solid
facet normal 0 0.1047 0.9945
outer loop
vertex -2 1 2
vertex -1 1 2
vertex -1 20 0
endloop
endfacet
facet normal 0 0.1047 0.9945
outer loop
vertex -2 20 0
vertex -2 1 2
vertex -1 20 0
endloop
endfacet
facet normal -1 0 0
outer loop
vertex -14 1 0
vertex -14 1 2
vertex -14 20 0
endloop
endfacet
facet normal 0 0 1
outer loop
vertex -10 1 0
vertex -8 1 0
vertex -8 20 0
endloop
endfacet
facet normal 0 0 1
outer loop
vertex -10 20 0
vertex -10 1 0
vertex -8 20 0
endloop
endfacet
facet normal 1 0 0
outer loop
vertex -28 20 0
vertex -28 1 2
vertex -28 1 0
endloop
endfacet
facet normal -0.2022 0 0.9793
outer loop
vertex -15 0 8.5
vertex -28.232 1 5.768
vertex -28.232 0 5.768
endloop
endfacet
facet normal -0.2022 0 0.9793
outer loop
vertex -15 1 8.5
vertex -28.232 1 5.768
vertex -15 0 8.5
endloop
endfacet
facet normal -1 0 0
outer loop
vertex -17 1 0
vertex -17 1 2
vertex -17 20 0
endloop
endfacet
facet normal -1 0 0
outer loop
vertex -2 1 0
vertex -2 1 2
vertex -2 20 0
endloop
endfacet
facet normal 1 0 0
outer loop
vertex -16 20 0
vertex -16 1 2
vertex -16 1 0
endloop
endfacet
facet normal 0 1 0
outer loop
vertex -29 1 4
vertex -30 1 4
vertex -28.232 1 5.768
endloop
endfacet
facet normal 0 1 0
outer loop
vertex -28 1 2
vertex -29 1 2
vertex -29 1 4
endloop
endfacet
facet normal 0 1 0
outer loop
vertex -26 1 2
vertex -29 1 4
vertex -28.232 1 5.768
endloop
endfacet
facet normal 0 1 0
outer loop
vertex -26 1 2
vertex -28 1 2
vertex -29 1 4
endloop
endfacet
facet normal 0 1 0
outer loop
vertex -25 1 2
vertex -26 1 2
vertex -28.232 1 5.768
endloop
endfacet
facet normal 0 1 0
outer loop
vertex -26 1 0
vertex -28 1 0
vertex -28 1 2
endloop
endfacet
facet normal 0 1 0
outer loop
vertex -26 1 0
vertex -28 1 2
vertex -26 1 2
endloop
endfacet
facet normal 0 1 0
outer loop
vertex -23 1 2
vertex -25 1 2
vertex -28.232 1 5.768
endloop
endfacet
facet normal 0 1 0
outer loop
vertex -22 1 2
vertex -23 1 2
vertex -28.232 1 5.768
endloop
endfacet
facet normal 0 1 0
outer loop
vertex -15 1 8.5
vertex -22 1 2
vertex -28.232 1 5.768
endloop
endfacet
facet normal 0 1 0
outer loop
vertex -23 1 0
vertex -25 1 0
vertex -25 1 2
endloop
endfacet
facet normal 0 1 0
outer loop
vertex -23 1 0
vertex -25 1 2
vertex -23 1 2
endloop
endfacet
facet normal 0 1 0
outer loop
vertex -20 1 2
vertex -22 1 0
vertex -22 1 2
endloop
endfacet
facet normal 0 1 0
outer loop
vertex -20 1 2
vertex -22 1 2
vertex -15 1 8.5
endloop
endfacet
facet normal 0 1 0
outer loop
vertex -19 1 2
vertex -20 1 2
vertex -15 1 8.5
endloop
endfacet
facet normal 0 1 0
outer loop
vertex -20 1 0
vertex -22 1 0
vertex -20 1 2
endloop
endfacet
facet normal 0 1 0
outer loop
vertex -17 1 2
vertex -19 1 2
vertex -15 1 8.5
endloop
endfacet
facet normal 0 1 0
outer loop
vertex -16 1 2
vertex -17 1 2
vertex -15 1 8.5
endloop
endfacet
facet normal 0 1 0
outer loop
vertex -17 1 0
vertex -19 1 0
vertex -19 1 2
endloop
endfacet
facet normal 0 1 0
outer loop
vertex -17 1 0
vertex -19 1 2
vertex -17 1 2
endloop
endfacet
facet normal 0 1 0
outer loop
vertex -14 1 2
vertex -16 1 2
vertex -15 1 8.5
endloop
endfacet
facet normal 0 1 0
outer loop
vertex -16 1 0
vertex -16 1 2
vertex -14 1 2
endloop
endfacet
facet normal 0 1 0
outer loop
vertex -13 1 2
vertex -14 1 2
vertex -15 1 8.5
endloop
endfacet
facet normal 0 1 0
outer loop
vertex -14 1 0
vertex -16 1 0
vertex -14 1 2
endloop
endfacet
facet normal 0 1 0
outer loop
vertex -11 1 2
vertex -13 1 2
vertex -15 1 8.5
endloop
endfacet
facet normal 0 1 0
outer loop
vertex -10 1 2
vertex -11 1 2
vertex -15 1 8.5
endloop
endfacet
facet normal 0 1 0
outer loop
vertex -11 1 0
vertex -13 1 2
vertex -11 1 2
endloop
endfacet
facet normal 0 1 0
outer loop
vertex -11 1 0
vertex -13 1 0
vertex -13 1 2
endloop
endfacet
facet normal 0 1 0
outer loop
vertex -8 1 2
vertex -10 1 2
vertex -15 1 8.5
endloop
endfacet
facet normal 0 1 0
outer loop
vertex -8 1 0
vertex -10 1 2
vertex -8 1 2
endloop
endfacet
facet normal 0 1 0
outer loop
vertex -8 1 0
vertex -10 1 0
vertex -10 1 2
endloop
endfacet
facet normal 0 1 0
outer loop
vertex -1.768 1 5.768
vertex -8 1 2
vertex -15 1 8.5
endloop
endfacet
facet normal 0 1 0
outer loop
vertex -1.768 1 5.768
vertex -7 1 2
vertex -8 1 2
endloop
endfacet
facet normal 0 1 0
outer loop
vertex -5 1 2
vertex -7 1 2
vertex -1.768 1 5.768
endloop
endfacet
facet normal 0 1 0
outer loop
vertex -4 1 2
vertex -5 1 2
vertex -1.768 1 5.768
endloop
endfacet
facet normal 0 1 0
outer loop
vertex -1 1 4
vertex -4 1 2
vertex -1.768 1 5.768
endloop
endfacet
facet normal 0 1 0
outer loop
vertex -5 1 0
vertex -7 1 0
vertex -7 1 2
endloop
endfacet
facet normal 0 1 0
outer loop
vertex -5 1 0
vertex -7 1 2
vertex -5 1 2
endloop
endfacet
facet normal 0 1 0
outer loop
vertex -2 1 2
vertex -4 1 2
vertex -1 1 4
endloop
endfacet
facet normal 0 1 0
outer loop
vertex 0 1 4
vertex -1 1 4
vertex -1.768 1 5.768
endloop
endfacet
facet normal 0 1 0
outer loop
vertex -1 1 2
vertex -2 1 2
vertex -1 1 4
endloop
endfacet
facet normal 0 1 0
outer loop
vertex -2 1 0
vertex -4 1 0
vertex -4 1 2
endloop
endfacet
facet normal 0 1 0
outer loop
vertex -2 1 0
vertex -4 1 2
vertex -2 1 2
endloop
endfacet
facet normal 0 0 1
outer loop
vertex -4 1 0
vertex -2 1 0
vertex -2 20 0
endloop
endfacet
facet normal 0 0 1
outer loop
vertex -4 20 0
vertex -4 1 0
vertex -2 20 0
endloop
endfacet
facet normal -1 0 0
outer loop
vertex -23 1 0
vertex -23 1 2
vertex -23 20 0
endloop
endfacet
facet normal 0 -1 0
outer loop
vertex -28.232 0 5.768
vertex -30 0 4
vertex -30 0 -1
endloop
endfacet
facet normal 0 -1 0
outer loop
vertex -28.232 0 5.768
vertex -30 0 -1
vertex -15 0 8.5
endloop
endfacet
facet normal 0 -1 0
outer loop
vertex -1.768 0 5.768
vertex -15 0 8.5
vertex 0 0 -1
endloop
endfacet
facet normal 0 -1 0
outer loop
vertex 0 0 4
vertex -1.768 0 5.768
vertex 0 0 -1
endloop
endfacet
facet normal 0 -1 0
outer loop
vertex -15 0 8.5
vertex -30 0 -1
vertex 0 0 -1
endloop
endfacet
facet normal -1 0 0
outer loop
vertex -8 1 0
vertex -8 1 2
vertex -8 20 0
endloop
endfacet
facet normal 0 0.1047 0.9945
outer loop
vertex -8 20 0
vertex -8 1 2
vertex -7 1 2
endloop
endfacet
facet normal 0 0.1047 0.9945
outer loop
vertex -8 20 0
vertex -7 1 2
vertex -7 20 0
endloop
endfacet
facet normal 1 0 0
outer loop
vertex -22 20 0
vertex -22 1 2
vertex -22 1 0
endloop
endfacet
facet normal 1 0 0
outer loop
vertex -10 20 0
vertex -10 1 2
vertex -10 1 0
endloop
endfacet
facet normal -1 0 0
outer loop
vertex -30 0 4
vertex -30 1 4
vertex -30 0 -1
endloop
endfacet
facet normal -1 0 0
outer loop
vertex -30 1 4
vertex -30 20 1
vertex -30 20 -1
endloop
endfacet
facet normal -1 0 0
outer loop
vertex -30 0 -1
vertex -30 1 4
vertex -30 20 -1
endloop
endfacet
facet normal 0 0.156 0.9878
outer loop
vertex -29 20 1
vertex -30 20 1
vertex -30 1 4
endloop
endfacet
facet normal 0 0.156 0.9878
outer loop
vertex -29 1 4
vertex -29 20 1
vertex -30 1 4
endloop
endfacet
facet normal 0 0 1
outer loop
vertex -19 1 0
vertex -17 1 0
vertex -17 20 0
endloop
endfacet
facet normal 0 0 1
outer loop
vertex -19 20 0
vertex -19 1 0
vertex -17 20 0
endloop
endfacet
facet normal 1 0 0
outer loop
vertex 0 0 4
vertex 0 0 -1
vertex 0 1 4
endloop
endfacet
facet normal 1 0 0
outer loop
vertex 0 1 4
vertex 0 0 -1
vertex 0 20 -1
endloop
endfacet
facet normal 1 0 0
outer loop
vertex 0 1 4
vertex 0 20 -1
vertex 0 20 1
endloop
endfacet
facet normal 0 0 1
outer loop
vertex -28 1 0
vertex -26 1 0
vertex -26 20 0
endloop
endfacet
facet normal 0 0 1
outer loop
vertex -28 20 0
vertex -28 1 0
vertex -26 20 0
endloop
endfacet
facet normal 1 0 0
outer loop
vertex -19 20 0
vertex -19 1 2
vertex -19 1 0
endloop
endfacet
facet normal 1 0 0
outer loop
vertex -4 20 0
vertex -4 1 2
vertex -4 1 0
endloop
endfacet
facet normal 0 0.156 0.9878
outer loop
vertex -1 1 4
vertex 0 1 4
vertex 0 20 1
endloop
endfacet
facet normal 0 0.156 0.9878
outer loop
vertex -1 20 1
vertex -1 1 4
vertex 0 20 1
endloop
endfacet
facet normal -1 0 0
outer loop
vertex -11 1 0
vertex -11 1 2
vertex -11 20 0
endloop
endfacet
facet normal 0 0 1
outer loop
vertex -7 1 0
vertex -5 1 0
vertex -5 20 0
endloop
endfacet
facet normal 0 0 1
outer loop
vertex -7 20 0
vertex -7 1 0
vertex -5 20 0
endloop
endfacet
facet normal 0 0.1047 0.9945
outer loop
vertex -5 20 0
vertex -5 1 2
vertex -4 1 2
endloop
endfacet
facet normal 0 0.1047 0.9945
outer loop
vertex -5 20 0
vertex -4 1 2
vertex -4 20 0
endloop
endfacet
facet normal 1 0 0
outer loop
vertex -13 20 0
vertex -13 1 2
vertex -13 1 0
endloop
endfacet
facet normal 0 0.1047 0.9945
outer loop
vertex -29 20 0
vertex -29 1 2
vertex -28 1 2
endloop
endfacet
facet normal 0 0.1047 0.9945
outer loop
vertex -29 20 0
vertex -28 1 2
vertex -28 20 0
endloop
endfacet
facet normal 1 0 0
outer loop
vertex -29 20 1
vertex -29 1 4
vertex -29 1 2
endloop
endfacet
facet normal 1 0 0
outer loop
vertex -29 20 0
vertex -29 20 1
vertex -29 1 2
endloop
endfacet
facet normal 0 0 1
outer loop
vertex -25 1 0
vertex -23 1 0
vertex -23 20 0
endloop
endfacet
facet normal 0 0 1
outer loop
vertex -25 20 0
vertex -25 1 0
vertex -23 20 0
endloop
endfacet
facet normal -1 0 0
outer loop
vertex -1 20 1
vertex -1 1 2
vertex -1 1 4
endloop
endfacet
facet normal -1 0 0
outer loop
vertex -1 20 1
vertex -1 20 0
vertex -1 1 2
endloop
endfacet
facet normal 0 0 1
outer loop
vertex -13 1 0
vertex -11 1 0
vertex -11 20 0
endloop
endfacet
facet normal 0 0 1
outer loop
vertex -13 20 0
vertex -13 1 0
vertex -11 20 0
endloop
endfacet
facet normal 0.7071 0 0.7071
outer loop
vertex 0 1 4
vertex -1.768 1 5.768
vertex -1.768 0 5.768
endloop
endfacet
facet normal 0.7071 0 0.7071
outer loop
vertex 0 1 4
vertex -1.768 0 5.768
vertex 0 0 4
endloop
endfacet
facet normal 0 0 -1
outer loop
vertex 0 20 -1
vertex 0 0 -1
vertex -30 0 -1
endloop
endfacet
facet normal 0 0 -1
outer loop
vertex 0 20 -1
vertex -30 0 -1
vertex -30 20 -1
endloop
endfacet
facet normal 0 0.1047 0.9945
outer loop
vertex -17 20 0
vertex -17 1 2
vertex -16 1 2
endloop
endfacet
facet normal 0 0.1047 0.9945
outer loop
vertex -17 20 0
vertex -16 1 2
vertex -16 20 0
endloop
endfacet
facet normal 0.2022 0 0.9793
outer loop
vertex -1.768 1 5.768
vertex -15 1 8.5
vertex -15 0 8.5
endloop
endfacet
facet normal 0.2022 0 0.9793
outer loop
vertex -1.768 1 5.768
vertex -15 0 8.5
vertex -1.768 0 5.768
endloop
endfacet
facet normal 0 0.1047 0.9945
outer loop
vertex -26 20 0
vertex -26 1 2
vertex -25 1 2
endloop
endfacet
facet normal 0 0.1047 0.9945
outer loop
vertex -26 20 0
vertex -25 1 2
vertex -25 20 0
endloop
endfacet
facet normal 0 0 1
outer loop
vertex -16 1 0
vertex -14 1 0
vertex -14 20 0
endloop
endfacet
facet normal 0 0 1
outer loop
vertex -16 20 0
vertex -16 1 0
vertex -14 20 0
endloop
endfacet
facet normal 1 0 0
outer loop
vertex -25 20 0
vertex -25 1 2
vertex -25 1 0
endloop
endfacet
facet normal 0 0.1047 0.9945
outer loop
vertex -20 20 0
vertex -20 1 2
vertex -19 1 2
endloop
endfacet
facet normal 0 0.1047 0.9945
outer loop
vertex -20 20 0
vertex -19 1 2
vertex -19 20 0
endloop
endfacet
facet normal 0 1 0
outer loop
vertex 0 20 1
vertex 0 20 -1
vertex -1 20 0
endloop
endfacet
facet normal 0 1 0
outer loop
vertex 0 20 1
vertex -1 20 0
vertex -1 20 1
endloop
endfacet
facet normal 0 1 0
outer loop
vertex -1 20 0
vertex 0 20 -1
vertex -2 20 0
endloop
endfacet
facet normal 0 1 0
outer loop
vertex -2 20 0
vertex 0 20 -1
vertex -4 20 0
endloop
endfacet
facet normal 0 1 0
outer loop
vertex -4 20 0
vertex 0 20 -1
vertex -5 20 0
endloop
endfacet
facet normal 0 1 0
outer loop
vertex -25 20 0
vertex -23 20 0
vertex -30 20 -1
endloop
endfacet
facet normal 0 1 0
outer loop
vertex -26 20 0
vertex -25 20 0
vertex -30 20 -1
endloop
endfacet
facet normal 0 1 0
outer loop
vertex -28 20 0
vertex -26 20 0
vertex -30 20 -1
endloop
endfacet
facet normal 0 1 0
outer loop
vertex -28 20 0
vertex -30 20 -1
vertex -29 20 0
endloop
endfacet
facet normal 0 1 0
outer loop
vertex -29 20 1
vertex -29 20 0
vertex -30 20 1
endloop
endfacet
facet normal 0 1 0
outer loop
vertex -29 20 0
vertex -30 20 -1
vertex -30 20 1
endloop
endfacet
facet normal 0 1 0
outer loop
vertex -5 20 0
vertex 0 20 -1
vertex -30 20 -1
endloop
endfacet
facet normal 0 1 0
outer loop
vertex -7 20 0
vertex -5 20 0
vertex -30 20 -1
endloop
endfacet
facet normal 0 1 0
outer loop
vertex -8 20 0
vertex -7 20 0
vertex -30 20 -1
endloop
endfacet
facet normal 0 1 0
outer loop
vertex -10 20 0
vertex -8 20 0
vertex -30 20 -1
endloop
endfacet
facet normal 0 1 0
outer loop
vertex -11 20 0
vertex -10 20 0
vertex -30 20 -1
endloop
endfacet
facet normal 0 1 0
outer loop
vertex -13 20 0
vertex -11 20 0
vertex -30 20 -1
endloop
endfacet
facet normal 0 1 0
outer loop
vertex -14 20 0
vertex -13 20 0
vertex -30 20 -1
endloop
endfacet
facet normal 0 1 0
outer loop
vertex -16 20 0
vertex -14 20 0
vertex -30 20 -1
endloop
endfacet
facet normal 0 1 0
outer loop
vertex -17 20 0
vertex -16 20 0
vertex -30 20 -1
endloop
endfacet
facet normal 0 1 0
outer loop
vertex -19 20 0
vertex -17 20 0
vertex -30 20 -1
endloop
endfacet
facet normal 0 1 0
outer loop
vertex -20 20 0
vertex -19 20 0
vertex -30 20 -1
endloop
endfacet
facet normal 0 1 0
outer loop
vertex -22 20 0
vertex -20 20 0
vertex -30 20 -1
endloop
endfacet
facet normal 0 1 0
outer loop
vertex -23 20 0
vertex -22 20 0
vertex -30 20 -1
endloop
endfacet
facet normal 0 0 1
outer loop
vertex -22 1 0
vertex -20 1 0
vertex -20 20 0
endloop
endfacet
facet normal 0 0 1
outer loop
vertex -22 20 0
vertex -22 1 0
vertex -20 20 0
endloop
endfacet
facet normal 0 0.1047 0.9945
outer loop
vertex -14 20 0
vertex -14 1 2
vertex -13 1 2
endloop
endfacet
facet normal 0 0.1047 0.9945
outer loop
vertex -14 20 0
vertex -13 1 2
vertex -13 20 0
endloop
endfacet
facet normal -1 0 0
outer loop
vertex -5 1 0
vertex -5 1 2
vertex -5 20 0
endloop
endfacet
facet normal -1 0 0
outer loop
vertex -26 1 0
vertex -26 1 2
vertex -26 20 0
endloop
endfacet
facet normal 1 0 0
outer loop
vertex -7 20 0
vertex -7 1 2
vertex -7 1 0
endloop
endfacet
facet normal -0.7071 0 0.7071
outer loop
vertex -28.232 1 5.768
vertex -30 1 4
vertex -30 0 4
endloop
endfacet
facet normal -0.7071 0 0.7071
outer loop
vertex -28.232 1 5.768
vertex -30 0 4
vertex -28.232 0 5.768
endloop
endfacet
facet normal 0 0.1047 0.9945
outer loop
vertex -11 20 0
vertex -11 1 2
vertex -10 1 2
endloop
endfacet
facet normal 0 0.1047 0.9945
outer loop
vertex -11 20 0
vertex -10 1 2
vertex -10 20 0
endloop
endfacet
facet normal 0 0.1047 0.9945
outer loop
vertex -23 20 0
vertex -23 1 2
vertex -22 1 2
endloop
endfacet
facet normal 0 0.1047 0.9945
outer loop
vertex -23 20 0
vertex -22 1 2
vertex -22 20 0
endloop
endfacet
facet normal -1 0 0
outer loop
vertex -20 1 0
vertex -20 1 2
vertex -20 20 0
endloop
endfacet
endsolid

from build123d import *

# Parameters (mm, degrees)
CROQUIS1_W              = 1
CROQUIS1_H              = 20
SALIENTE_EXTRUIR1_DEPTH = 30
CROQUIS2_W              = 4
CROQUIS2_H              = 1
SALIENTE_EXTRUIR3_DEPTH = 30
SALIENTE_EXTRUIR4_DEPTH = 1
SALIENTE_EXTRUIR5_DEPTH = 1
SALIENTE_EXTRUIR7_DEPTH = 1
NERVIO4_REACH           = 38.239
CROQUIS8_WALL_W         = 93.582555916
CROQUIS8_WALL_H         = 1
MATRIZL12_COUNT         = 9
MATRIZL12_PITCH         = 3
NERVIO5_REACH           = 38.239
CROQUIS10_WALL_W        = 93.582555916
CROQUIS10_WALL_H        = 1


with BuildPart() as part:
    # Croquis1 → Saliente-Extruir1 (new body)
    with BuildSketch(Plane(origin=(0, 0, 0), x_dir=(0, 0, -1), z_dir=(1, 0, 0))):
        with Locations((0.5, 10)):
            Rectangle(CROQUIS1_W, CROQUIS1_H)
    extrude(amount=-SALIENTE_EXTRUIR1_DEPTH)

    # Croquis2 → Saliente-Extruir3 (add)
    with BuildSketch(Plane(origin=(0, 0, 0), x_dir=(0, 0, -1), z_dir=(1, 0, 0))):
        with Locations((-2, 0.5)):
            Rectangle(CROQUIS2_W, CROQUIS2_H)
    extrude(amount=-SALIENTE_EXTRUIR3_DEPTH)

    # Croquis3 → Saliente-Extruir4 (add)
    with BuildSketch(Plane(origin=(0, 0, 0), x_dir=(0, 0, -1), z_dir=(1, 0, 0))):
        Polygon((-4, 1), (-1, 20), (0, 20), (0, 1), align=None)
    extrude(amount=-SALIENTE_EXTRUIR4_DEPTH)

    # Croquis6 → Saliente-Extruir5 (add)
    with BuildSketch(Plane.ZY.offset(30)):
        Polygon((0, 20), (1, 20), (4, 1), (0, 1), align=None)
    extrude(amount=-SALIENTE_EXTRUIR5_DEPTH)

    # Croquis7 → Saliente-Extruir7 (add)
    with BuildSketch(Plane(origin=(0, 1, 0), x_dir=(1, 0, 0), z_dir=(0, 1, 0))):
        Polygon((-30, -4), (-28.232233047, -5.767766953), (-15, -8.5), (-1.767766953, -5.767766953), (0, -4), align=None)
    extrude(amount=-SALIENTE_EXTRUIR7_DEPTH)

    # Croquis8 wall → Nervio4 (add, up to next)
    with BuildSketch(Plane(origin=(-29, 10.5, 1), x_dir=(0, 0.994505452921, -0.104684784518), z_dir=(0, 0.104684784518, 0.994505452921)), mode=Mode.PRIVATE) as nervio4_sk1:
        with Locations((0, -0.5)):
            Rectangle(CROQUIS8_WALL_W, CROQUIS8_WALL_H)
    nervio4_tool1 = extrude(nervio4_sk1.sketch, amount=-NERVIO4_REACH, mode=Mode.PRIVATE) - part.part
    nervio4 = nervio4_tool1.solids().sort_by_distance((-29, 10.5, 1))[0]
    add(nervio4)

    # MatrizL12: Nervio4 ×9
    with Locations(*[(i * MATRIZL12_PITCH, 0, 0) for i in range(1, MATRIZL12_COUNT)]):
        add(nervio4)

    # Croquis10 wall → Nervio5 (add, up to next)
    with BuildSketch(Plane(origin=(-1, 10.5, 1), x_dir=(0, 0.994505452921, -0.104684784518), z_dir=(0, -0.104684784518, -0.994505452921)), mode=Mode.PRIVATE) as nervio5_sk1:
        with Locations((0, -0.5)):
            Rectangle(CROQUIS10_WALL_W, CROQUIS10_WALL_H)
    nervio5_tool1 = extrude(nervio5_sk1.sketch, amount=NERVIO5_REACH, mode=Mode.PRIVATE) - part.part
    add(nervio5_tool1.solids().sort_by_distance((-1, 10.5, 1))[0])


solid = part.part
